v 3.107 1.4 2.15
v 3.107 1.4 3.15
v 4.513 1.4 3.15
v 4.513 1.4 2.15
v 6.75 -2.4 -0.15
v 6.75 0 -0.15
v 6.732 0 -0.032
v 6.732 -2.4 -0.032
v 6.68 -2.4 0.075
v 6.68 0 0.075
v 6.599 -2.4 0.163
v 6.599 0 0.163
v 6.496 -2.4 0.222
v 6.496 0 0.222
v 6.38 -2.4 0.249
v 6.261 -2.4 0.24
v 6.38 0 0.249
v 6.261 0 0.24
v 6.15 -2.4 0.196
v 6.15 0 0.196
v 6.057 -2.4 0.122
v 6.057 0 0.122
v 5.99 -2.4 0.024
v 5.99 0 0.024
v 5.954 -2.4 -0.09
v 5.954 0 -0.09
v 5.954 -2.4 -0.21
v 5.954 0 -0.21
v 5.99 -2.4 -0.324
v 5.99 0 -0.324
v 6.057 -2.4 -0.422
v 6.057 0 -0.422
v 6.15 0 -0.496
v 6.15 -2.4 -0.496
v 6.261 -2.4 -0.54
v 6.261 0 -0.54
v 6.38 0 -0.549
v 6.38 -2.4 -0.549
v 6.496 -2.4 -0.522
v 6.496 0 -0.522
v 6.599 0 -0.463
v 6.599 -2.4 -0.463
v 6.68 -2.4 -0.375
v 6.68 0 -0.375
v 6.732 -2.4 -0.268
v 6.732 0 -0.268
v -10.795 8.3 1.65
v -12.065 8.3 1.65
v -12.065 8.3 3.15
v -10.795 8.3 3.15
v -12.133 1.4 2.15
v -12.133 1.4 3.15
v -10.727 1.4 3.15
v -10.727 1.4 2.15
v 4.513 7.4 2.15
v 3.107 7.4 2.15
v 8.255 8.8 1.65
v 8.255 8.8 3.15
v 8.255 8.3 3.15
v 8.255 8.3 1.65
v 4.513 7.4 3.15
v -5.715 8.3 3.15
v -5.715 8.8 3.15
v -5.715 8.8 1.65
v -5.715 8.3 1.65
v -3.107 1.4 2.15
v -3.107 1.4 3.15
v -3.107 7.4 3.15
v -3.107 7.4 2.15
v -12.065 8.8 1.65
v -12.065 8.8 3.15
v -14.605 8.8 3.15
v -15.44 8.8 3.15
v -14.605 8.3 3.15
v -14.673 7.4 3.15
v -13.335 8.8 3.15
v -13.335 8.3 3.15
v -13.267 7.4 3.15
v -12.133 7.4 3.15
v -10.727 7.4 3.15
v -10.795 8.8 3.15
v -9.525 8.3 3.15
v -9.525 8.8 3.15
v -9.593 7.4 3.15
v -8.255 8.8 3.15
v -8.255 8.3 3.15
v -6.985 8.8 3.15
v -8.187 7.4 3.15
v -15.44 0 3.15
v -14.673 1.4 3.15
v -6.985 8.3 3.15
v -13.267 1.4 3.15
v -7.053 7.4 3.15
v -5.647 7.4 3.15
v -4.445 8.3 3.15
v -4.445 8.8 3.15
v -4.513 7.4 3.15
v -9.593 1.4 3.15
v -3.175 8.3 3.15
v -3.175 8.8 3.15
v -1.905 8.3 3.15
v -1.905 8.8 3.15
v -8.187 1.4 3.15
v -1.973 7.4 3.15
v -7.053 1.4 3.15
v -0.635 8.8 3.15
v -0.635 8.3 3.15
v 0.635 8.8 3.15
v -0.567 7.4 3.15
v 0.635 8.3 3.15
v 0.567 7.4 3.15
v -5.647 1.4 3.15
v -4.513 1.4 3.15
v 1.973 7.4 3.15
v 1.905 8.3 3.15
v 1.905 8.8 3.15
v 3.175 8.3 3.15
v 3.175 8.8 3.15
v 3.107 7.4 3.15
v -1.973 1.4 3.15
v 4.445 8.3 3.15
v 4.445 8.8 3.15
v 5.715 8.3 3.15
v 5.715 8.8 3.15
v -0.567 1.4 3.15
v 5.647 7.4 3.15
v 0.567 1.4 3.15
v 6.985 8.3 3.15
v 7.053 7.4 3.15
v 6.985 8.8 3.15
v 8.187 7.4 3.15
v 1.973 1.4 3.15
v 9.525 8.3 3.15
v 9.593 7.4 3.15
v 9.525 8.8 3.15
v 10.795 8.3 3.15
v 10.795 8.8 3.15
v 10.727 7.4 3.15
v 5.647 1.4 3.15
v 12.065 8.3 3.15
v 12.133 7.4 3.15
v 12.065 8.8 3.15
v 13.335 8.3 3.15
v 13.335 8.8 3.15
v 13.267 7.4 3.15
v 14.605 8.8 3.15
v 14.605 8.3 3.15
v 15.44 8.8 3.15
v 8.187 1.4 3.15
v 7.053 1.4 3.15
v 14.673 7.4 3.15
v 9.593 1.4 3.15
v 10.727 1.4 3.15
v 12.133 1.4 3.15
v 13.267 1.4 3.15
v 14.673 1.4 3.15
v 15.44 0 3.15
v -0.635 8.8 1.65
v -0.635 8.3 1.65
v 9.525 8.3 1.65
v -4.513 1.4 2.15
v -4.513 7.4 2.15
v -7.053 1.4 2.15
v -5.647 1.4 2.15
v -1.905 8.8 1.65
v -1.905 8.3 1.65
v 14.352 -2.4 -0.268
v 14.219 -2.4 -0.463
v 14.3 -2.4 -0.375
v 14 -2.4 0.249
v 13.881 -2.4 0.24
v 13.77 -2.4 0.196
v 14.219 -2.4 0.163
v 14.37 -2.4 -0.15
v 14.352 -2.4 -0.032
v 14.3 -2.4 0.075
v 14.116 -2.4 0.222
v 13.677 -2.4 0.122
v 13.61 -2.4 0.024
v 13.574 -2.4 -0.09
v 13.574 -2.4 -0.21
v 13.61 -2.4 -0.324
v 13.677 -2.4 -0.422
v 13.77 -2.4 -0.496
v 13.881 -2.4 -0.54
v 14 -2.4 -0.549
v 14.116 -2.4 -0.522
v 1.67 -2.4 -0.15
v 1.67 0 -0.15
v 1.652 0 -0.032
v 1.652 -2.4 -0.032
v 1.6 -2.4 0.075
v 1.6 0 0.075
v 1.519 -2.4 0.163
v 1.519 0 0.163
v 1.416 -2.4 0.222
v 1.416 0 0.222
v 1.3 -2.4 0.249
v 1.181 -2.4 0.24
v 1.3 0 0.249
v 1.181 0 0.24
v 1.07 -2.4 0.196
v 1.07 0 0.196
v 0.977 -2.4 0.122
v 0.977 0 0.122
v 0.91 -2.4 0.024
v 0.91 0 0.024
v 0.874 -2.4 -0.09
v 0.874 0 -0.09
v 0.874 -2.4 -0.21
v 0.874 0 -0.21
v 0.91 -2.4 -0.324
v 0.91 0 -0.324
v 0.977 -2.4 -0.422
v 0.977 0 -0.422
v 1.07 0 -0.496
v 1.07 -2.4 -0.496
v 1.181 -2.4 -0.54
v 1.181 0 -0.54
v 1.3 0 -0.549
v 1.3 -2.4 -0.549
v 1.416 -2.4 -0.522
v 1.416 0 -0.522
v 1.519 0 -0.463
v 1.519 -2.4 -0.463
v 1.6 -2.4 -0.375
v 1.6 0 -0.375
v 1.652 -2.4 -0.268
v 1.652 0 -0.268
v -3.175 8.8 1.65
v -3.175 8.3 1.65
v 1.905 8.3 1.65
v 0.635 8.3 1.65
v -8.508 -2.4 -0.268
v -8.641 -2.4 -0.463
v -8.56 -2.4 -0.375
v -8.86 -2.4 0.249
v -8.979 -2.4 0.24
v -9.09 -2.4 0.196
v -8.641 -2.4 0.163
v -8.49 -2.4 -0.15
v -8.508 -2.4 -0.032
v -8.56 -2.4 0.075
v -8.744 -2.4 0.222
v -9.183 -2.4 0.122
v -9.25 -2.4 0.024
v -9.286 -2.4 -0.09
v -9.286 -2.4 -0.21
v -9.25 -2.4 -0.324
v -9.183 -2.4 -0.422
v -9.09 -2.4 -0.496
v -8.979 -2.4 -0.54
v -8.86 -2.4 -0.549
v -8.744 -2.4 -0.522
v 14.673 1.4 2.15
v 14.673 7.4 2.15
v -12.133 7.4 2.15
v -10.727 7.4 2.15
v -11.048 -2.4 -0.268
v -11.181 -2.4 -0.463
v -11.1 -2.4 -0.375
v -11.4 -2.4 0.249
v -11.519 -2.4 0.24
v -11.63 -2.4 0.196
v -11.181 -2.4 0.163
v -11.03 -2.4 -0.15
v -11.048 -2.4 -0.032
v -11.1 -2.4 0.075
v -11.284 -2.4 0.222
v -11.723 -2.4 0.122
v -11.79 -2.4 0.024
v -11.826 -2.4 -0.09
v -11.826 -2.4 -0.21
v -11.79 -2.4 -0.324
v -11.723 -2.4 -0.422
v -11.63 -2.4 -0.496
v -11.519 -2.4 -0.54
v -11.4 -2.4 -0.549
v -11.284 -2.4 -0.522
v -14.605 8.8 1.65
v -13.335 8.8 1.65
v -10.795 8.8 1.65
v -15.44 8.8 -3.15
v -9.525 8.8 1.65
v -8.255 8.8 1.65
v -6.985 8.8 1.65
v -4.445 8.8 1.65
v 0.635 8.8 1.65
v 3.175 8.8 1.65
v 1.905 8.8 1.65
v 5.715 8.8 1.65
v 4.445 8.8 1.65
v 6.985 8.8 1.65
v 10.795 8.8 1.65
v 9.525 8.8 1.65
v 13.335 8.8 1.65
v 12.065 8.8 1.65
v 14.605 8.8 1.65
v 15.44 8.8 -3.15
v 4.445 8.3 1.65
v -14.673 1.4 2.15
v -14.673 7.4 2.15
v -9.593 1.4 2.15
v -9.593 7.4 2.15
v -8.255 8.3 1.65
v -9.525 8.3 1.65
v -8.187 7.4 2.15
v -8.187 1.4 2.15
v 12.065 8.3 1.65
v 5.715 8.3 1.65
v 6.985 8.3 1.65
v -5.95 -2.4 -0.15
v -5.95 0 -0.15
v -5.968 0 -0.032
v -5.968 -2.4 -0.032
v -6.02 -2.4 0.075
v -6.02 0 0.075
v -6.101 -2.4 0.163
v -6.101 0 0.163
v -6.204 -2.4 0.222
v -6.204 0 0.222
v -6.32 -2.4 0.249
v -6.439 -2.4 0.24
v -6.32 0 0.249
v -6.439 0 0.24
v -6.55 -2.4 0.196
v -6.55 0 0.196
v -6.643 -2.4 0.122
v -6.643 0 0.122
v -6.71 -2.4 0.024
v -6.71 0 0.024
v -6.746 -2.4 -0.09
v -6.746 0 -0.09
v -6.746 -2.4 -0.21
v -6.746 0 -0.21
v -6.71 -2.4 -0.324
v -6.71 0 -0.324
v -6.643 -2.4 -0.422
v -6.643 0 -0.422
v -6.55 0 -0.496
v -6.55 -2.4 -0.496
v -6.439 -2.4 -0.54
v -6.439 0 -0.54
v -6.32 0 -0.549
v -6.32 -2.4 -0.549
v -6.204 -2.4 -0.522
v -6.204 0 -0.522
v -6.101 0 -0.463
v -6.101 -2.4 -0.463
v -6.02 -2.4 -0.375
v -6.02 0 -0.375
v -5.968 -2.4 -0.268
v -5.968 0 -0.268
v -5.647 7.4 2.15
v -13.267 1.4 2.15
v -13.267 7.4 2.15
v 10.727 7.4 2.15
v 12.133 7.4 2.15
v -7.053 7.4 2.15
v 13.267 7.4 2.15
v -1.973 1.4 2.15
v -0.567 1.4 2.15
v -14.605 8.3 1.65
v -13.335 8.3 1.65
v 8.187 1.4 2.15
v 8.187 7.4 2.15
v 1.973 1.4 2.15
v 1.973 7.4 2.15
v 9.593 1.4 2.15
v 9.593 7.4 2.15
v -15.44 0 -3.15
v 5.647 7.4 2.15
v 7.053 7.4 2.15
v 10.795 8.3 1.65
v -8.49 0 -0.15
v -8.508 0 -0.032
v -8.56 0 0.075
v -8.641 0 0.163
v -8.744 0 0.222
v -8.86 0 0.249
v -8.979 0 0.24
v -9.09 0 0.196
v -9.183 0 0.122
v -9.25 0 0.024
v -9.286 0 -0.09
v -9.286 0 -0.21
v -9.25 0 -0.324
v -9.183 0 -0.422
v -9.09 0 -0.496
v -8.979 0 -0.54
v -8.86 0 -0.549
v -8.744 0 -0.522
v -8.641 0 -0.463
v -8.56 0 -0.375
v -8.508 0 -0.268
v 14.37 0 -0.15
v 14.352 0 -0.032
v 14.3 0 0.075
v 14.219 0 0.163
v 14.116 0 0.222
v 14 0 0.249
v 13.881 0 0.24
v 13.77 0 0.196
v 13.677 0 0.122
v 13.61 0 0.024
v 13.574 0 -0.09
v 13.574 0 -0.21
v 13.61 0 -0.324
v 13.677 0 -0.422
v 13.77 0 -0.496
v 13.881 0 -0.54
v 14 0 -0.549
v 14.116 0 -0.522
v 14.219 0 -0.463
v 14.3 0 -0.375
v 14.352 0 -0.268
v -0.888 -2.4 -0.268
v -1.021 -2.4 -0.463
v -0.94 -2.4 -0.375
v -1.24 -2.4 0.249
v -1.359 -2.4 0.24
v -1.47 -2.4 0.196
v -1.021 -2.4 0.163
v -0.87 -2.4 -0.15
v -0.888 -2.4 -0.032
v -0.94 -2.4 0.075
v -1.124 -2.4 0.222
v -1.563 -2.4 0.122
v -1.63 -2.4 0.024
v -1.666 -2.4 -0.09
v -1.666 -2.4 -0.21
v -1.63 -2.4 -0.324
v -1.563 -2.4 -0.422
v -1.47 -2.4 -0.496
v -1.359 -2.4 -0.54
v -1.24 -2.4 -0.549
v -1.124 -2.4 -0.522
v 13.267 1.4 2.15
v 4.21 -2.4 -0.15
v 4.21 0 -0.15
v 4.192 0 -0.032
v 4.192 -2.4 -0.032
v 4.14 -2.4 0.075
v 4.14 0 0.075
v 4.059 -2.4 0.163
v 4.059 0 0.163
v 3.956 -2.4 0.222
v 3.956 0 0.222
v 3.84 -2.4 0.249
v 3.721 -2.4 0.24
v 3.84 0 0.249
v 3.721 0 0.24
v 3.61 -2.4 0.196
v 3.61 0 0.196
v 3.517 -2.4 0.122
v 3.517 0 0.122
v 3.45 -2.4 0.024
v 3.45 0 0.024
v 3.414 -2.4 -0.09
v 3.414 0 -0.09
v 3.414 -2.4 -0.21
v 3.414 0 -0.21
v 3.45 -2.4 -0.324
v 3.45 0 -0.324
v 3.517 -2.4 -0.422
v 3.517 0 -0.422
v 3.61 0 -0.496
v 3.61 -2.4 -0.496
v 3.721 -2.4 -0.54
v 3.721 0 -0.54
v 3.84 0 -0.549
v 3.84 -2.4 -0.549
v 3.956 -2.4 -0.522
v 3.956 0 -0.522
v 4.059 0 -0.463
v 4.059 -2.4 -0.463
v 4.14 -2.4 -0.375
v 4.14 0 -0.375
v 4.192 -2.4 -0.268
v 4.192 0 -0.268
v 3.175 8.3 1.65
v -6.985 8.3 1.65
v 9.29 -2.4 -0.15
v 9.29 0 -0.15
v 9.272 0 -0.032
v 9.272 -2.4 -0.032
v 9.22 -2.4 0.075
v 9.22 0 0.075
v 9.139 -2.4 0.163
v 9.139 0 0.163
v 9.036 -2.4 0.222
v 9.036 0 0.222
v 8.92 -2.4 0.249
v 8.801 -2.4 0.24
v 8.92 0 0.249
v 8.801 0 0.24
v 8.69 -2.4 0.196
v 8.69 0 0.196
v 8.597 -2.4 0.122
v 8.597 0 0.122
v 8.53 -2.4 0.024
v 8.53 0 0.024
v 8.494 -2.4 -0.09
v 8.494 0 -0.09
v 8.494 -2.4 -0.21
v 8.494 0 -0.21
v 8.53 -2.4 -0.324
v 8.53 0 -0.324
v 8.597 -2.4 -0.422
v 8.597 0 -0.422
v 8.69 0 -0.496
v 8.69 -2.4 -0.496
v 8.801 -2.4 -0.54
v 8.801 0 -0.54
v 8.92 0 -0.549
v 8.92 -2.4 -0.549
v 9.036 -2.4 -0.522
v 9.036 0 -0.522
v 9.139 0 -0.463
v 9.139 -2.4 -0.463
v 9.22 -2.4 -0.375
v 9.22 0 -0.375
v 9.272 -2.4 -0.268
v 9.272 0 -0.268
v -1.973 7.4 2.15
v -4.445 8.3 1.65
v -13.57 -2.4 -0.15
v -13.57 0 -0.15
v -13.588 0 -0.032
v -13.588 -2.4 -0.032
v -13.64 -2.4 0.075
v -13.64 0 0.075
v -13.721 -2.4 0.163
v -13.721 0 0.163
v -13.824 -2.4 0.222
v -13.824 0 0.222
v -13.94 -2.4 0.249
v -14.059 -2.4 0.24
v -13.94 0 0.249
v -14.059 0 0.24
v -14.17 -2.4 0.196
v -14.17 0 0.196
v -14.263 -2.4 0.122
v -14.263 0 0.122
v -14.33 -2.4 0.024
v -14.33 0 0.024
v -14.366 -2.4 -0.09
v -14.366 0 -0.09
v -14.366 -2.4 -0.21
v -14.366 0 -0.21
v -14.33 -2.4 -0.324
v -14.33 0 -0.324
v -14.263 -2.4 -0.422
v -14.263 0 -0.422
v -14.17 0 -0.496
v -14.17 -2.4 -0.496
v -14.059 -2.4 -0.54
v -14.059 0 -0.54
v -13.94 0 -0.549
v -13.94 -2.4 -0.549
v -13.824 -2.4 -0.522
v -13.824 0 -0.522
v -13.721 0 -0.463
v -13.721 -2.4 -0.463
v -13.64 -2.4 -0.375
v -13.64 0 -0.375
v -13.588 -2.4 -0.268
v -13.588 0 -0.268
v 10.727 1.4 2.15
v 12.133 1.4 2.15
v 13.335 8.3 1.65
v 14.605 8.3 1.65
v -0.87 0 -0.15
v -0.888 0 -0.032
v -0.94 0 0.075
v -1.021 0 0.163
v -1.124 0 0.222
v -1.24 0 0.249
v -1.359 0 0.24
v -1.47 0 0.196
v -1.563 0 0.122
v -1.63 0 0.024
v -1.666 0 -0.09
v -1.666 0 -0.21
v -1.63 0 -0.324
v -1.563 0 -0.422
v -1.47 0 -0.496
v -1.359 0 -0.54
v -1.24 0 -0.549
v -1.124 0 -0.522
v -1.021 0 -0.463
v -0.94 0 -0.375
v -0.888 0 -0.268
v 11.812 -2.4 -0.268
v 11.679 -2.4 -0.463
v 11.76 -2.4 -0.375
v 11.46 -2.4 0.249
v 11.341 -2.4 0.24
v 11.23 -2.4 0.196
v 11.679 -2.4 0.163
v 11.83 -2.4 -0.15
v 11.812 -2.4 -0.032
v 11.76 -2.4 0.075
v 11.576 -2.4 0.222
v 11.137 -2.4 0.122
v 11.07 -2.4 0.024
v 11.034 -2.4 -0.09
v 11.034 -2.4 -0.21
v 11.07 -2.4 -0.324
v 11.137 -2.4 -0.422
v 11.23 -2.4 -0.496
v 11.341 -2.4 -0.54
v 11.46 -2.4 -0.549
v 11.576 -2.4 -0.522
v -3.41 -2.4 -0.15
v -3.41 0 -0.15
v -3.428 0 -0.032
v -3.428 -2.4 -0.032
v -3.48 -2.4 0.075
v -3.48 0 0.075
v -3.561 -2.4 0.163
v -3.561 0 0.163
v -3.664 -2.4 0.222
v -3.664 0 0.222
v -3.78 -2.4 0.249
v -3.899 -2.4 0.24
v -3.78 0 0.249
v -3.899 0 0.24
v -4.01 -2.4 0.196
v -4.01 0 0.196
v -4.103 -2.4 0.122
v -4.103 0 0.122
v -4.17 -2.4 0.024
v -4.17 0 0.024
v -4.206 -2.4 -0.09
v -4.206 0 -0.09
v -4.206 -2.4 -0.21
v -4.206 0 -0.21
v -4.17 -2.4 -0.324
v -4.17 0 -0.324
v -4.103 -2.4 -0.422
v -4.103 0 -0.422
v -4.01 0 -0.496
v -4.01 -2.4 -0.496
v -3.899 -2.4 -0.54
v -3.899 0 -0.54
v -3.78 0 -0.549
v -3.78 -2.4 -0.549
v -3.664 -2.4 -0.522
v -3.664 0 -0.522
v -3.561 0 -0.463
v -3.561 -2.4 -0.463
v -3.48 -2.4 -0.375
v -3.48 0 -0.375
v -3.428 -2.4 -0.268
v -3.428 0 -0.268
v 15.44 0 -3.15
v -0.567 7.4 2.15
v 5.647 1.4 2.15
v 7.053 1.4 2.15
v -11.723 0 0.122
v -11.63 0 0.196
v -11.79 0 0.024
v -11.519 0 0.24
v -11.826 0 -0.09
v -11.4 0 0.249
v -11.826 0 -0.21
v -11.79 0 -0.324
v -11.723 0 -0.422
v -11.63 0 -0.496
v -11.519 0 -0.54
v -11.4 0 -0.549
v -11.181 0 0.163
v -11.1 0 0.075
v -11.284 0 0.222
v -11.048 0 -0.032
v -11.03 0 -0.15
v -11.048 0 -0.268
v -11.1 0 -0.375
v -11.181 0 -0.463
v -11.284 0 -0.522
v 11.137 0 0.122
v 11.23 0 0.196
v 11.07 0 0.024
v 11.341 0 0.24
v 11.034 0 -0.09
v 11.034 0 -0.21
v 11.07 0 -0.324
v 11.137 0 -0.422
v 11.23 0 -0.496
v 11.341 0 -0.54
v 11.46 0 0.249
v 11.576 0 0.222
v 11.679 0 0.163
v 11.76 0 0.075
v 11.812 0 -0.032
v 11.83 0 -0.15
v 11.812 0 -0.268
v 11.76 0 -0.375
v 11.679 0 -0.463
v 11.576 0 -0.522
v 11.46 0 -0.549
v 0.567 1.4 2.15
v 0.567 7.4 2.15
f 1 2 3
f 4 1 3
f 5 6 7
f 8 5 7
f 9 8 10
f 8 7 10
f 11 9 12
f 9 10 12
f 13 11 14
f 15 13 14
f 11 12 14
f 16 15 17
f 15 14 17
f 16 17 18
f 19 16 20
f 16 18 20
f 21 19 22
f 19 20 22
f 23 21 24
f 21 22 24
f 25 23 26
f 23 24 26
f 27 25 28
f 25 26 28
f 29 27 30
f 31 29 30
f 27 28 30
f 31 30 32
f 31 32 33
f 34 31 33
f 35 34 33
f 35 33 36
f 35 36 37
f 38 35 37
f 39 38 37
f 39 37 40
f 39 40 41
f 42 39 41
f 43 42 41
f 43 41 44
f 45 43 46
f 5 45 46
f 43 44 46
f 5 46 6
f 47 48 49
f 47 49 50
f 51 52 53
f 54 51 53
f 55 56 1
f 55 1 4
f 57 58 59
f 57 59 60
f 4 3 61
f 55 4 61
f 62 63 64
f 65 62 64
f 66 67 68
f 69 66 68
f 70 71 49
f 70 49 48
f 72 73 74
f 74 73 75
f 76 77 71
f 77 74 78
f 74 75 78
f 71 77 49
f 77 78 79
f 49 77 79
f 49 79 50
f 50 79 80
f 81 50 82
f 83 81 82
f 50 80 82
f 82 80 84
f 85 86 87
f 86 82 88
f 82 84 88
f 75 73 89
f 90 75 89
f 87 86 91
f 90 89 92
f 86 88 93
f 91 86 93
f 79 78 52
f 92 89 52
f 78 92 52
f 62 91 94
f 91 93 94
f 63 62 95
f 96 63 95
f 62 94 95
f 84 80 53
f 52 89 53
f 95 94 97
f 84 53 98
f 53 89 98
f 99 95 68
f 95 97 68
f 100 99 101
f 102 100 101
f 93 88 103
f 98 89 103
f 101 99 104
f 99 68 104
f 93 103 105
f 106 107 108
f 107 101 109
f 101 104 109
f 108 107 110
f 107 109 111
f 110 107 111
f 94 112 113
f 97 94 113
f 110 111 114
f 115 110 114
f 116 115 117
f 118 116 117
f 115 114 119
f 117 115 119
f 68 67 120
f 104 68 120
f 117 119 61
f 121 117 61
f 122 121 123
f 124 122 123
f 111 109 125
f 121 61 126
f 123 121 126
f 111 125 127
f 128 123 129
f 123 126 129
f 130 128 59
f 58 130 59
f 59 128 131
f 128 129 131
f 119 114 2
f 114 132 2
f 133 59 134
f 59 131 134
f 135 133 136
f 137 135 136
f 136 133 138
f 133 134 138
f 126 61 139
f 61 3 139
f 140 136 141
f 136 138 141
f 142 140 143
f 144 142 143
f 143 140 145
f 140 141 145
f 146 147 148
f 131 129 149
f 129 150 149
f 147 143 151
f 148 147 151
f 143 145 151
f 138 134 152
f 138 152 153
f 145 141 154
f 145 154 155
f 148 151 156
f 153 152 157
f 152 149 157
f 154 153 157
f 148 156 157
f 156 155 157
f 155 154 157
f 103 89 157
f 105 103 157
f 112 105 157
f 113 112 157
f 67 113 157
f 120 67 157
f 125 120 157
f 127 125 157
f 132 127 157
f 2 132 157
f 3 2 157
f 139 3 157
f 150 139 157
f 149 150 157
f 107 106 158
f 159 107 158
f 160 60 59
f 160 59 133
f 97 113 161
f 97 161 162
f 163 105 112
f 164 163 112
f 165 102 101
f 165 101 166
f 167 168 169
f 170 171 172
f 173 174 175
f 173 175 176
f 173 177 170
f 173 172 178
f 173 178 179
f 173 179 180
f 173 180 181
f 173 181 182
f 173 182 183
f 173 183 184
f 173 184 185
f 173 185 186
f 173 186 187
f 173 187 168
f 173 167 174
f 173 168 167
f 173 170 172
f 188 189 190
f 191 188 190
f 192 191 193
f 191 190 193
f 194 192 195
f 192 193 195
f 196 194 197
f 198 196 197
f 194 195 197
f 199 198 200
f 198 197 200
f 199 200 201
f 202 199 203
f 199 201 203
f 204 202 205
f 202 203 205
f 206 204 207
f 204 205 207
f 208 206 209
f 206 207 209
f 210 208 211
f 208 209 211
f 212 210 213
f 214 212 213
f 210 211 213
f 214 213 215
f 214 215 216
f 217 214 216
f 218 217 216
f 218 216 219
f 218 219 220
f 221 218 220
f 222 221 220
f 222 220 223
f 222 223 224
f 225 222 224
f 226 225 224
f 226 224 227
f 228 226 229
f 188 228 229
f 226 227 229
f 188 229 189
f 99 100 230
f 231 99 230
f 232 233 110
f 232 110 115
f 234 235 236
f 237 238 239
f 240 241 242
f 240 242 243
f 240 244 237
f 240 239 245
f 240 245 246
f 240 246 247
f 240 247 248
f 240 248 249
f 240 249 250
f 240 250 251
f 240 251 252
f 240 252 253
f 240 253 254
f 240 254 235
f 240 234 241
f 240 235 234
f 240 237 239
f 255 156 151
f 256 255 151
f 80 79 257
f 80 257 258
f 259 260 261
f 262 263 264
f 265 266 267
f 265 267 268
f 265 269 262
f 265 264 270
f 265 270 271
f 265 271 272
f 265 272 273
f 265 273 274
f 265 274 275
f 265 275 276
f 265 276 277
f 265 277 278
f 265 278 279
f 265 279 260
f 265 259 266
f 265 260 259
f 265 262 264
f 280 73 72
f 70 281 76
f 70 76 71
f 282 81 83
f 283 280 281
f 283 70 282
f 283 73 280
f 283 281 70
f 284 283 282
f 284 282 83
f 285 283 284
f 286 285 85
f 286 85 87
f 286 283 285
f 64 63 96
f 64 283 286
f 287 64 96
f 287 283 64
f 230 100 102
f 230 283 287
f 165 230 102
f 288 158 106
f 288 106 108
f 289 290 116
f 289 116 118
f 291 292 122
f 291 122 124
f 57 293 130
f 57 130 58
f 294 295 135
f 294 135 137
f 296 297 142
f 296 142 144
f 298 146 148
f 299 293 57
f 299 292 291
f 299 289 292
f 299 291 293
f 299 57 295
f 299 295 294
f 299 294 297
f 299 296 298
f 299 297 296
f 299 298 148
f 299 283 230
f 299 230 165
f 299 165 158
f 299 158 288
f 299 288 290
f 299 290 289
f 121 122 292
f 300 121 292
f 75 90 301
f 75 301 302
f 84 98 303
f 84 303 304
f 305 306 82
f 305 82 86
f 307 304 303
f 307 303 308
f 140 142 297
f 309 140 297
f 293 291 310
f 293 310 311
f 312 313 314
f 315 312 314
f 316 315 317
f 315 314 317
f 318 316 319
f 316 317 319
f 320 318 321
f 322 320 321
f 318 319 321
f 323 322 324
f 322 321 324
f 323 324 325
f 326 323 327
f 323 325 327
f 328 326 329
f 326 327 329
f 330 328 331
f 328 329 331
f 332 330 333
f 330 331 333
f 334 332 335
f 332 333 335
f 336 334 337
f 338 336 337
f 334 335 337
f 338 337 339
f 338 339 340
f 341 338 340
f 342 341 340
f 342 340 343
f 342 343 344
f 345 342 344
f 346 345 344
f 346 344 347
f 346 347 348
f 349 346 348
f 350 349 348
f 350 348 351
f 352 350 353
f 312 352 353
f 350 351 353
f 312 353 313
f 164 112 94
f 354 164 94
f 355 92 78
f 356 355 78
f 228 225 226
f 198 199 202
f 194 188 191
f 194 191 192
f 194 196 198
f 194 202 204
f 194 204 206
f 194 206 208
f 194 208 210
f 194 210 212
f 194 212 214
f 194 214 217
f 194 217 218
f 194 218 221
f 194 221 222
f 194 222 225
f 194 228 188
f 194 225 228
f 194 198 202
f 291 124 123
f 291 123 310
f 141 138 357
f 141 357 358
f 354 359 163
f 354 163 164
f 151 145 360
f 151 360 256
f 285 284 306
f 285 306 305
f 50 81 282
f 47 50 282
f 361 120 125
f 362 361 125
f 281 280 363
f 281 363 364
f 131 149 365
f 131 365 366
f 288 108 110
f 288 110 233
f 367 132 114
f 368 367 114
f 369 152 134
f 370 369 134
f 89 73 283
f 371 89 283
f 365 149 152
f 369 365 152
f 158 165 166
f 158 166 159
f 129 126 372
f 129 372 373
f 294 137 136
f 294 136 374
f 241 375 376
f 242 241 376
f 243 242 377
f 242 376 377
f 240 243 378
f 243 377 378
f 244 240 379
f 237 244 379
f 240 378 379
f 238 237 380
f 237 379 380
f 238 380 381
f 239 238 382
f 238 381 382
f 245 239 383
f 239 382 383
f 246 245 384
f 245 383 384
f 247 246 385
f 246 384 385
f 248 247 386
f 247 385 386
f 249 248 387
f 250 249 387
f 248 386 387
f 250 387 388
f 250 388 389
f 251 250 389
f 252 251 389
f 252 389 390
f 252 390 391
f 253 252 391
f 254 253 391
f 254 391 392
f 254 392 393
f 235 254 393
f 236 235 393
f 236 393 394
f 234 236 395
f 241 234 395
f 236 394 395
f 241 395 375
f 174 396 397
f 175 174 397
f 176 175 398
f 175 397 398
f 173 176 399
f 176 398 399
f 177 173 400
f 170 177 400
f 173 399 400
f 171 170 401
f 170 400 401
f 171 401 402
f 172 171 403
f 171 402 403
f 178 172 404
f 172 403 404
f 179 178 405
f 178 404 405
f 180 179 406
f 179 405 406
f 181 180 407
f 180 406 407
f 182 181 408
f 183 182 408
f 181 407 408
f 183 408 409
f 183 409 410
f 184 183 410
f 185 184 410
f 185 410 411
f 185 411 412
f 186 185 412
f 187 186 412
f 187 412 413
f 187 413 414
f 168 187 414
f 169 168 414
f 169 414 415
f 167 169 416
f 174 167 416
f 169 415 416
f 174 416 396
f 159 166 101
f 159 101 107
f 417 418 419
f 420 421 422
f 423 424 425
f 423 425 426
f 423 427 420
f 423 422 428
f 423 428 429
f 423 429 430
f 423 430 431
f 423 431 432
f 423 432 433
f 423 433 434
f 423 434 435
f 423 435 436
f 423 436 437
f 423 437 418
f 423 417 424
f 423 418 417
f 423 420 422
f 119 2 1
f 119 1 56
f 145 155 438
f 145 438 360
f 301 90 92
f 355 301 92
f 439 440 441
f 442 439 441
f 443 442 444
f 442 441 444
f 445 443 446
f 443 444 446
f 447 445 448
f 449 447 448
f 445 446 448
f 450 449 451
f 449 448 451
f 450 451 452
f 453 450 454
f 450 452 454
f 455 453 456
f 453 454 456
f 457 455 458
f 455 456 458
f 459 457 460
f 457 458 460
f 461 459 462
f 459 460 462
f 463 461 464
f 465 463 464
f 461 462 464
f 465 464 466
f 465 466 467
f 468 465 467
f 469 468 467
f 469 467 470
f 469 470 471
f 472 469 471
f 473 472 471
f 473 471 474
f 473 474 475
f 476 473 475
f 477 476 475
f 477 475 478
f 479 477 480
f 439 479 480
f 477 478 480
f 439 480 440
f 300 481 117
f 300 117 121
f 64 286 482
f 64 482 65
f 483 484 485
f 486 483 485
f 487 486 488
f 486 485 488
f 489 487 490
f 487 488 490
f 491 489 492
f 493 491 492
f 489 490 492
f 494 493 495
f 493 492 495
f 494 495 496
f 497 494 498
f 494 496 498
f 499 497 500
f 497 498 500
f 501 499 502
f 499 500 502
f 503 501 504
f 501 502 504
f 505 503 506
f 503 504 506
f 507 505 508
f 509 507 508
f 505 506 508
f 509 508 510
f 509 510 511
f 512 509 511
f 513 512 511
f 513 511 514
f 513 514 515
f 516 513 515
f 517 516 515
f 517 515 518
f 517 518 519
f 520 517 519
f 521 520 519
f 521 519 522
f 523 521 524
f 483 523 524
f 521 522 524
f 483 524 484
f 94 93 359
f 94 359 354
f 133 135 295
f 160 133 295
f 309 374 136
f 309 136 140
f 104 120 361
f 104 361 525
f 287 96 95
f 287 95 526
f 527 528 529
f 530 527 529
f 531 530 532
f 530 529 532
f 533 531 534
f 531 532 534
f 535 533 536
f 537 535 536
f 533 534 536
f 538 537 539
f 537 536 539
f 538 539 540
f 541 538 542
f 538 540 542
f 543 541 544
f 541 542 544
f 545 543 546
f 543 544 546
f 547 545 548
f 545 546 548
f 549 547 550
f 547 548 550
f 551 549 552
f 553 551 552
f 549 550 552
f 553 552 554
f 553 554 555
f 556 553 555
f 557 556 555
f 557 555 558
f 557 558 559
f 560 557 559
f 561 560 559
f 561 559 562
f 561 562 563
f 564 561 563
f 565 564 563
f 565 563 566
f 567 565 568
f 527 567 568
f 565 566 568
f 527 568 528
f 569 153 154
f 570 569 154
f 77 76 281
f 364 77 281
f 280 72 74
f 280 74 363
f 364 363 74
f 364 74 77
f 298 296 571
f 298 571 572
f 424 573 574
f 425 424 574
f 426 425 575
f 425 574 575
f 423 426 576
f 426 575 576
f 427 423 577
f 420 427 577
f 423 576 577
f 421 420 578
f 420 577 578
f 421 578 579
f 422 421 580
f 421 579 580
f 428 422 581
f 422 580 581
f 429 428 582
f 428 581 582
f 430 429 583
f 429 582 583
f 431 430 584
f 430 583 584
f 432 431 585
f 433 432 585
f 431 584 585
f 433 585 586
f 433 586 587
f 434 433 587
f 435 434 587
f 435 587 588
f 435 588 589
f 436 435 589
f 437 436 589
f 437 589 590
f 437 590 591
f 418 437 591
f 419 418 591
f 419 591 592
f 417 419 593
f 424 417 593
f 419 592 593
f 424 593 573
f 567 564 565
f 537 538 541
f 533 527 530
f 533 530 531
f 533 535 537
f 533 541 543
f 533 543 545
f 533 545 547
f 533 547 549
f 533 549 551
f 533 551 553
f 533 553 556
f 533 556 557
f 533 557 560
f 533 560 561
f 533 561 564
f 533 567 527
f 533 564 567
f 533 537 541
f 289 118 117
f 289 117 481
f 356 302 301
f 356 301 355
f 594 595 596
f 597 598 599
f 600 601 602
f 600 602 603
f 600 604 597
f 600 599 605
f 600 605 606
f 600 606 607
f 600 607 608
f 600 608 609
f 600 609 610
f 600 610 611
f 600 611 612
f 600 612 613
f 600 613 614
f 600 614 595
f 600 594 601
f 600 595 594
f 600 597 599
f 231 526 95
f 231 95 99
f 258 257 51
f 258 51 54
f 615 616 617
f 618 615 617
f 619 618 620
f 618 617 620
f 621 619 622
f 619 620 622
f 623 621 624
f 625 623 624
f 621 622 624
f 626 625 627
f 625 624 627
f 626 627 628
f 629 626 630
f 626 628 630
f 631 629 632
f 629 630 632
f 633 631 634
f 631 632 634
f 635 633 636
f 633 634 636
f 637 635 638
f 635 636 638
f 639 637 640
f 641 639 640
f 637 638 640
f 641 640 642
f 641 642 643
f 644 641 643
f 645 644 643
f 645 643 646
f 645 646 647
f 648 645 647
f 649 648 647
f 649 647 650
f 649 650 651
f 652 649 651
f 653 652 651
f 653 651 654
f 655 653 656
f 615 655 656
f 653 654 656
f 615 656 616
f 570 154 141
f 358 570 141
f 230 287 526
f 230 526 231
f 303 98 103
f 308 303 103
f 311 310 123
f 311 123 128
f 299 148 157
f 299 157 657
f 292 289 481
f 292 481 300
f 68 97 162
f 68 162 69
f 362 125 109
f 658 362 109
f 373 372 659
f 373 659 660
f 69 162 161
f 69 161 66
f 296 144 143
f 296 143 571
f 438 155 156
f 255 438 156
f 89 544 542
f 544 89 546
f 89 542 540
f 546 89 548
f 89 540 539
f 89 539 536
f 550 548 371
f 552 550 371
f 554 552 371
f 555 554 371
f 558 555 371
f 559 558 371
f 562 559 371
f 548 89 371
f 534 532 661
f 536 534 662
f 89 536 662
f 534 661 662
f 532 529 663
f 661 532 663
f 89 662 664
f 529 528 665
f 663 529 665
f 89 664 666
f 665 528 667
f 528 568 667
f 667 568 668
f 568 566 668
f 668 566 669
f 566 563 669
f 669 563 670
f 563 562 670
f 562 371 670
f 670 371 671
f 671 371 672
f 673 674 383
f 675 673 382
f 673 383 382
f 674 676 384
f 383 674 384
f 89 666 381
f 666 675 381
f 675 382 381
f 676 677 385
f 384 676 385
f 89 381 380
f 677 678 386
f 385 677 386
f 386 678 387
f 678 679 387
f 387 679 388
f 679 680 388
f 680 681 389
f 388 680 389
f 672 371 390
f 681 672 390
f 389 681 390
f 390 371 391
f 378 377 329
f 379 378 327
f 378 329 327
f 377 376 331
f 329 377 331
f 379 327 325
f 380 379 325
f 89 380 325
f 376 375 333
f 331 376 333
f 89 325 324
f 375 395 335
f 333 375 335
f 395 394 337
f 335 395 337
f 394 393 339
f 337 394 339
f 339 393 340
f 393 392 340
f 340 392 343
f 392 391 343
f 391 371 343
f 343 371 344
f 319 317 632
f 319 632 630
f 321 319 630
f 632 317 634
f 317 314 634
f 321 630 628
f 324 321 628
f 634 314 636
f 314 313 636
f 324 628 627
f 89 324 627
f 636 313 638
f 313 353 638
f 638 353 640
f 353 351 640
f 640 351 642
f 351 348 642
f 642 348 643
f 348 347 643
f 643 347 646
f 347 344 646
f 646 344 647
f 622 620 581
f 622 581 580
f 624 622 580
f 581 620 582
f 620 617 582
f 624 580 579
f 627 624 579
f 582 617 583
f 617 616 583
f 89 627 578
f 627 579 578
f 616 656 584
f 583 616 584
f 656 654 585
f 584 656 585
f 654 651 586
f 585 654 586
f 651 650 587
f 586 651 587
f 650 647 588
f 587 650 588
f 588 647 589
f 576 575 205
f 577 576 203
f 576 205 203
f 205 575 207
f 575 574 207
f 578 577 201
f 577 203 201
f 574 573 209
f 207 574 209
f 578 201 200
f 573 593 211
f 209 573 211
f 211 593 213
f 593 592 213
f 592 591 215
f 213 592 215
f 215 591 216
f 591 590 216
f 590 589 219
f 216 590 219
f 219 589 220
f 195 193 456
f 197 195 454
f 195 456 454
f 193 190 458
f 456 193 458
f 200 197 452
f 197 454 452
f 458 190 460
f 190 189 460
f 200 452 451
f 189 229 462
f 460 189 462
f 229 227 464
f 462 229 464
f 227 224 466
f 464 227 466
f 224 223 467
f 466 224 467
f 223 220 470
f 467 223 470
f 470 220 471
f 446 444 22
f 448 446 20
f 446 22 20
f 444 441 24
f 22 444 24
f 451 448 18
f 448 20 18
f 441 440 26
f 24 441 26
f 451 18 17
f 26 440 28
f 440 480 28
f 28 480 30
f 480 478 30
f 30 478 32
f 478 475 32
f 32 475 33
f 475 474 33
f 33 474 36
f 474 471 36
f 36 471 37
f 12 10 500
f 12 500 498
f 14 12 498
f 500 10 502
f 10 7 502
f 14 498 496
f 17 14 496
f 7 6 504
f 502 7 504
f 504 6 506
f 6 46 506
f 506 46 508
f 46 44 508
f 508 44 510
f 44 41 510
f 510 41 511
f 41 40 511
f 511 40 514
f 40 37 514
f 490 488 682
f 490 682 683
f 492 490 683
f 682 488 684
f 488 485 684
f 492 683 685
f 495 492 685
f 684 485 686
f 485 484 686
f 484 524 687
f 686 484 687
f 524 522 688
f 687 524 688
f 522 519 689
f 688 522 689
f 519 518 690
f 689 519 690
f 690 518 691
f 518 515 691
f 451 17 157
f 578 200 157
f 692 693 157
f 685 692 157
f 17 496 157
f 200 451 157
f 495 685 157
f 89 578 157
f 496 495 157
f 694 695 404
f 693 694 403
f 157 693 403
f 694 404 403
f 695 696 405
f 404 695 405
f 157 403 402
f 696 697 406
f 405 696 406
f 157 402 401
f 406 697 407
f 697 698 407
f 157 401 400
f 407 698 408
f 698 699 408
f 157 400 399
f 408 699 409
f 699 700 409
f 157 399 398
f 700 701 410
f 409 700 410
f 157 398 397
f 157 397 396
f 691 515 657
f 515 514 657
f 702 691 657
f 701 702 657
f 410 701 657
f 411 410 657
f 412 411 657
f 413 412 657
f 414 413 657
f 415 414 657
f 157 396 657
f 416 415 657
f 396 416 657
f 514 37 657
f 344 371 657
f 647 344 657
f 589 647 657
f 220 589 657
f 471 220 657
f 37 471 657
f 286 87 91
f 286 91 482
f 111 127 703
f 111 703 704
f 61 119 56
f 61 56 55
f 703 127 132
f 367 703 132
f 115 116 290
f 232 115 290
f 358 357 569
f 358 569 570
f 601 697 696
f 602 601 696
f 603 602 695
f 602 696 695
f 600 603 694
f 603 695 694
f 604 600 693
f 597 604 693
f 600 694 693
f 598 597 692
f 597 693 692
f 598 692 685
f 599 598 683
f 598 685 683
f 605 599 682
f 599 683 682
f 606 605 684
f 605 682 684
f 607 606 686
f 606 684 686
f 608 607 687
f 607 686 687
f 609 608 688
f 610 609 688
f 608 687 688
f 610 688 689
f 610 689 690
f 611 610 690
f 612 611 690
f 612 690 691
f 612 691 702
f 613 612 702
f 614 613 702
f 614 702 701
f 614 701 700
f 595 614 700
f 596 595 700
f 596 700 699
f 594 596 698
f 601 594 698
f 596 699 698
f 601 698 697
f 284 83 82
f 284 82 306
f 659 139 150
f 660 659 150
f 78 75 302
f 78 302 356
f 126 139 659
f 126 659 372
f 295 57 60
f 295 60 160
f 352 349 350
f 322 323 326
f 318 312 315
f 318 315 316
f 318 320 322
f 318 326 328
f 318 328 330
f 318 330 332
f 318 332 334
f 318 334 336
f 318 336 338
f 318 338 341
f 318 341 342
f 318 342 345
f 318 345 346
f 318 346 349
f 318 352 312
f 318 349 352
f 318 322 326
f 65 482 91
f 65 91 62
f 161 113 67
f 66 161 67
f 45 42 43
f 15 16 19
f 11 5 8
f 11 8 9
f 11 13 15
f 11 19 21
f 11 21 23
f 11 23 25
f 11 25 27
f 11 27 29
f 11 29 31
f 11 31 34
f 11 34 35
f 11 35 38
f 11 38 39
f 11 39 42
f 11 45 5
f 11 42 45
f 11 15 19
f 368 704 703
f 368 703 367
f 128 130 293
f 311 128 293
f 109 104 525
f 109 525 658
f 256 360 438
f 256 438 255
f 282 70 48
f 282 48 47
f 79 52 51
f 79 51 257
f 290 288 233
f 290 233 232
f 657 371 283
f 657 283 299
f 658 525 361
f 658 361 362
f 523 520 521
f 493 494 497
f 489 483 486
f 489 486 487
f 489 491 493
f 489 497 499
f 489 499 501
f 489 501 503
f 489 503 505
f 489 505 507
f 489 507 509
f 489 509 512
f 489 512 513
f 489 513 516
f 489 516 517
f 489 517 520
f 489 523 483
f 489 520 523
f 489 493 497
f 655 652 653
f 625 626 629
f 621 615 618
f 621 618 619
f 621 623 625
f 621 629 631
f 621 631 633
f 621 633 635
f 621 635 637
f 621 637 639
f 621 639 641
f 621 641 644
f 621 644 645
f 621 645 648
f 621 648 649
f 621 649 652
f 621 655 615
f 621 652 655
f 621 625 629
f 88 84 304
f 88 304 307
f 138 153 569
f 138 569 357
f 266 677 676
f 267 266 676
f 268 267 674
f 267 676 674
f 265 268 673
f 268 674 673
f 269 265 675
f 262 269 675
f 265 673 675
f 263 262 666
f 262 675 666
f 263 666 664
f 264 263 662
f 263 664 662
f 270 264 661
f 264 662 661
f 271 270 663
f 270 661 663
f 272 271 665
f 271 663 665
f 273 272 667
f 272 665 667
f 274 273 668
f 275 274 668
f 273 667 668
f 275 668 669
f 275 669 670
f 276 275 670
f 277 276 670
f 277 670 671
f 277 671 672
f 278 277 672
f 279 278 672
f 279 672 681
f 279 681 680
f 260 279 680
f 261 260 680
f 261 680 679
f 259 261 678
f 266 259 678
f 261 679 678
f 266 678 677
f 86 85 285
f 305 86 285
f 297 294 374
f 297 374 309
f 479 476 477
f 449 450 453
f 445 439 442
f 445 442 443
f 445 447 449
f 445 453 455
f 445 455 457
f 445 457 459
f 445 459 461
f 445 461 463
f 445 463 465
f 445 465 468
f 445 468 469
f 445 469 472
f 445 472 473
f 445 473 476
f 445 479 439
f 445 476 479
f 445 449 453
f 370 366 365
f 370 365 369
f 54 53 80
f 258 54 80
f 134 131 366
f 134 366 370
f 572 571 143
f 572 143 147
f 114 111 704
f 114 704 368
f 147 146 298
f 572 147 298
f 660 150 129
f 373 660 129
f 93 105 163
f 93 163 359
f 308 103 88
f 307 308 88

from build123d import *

# Parameters (mm, degrees)
SKETCH2_W           = 30.88
SKETCH2_H           = 6.3
BOSS_EXTRUDE1_DEPTH = 8.8
SKETCH3_R           = 0.4
BOSS_EXTRUDE2_DEPTH = 2.4
SKETCH4_W           = 1.405361948
SKETCH4_H           = 6
CUT_EXTRUDE1_DEPTH  = 1
SKETCH5_W           = 1.27
SKETCH5_H           = 1.5
CUT_EXTRUDE2_DEPTH  = 0.5
LPATTERN1_COUNT     = 12
LPATTERN1_PITCH     = 2.54


with BuildPart() as part:
    # Sketch2 → Boss-Extrude1 (new body)
    with BuildSketch(Plane(origin=(0, 0, 0), x_dir=(1, 0, 0), z_dir=(0, 1, 0))):
        Rectangle(SKETCH2_W, SKETCH2_H)
    extrude(amount=BOSS_EXTRUDE1_DEPTH)

    # Sketch3 → Boss-Extrude2 (add)
    with BuildSketch(Plane.XZ):
        with Locations((-13.97, -0.15)):
            Circle(SKETCH3_R)
    boss_extrude2 = extrude(amount=BOSS_EXTRUDE2_DEPTH)

    # Sketch4 → Cut-Extrude1 (cut)
    with BuildSketch(Plane.XY.offset(3.15)):
        with Locations((-13.97, 4.4)):
            Rectangle(SKETCH4_W, SKETCH4_H)
    cut_extrude1 = extrude(amount=-CUT_EXTRUDE1_DEPTH, mode=Mode.SUBTRACT)

    # Sketch5 → Cut-Extrude2 (cut)
    with BuildSketch(Plane(origin=(0, 8.8, 0), x_dir=(1, 0, 0), z_dir=(0, 1, 0))):
        with Locations((-13.97, -2.4)):
            Rectangle(SKETCH5_W, SKETCH5_H)
    cut_extrude2 = extrude(amount=-CUT_EXTRUDE2_DEPTH, mode=Mode.SUBTRACT)

    # LPattern1: Boss-Extrude2, Cut-Extrude1, Cut-Extrude2 ×12
    with Locations(*[(i * LPATTERN1_PITCH, 0, 0) for i in range(1, LPATTERN1_COUNT)]):
        add(boss_extrude2)
        add(cut_extrude1, mode=Mode.SUBTRACT)
        add(cut_extrude2, mode=Mode.SUBTRACT)


solid = part.part
